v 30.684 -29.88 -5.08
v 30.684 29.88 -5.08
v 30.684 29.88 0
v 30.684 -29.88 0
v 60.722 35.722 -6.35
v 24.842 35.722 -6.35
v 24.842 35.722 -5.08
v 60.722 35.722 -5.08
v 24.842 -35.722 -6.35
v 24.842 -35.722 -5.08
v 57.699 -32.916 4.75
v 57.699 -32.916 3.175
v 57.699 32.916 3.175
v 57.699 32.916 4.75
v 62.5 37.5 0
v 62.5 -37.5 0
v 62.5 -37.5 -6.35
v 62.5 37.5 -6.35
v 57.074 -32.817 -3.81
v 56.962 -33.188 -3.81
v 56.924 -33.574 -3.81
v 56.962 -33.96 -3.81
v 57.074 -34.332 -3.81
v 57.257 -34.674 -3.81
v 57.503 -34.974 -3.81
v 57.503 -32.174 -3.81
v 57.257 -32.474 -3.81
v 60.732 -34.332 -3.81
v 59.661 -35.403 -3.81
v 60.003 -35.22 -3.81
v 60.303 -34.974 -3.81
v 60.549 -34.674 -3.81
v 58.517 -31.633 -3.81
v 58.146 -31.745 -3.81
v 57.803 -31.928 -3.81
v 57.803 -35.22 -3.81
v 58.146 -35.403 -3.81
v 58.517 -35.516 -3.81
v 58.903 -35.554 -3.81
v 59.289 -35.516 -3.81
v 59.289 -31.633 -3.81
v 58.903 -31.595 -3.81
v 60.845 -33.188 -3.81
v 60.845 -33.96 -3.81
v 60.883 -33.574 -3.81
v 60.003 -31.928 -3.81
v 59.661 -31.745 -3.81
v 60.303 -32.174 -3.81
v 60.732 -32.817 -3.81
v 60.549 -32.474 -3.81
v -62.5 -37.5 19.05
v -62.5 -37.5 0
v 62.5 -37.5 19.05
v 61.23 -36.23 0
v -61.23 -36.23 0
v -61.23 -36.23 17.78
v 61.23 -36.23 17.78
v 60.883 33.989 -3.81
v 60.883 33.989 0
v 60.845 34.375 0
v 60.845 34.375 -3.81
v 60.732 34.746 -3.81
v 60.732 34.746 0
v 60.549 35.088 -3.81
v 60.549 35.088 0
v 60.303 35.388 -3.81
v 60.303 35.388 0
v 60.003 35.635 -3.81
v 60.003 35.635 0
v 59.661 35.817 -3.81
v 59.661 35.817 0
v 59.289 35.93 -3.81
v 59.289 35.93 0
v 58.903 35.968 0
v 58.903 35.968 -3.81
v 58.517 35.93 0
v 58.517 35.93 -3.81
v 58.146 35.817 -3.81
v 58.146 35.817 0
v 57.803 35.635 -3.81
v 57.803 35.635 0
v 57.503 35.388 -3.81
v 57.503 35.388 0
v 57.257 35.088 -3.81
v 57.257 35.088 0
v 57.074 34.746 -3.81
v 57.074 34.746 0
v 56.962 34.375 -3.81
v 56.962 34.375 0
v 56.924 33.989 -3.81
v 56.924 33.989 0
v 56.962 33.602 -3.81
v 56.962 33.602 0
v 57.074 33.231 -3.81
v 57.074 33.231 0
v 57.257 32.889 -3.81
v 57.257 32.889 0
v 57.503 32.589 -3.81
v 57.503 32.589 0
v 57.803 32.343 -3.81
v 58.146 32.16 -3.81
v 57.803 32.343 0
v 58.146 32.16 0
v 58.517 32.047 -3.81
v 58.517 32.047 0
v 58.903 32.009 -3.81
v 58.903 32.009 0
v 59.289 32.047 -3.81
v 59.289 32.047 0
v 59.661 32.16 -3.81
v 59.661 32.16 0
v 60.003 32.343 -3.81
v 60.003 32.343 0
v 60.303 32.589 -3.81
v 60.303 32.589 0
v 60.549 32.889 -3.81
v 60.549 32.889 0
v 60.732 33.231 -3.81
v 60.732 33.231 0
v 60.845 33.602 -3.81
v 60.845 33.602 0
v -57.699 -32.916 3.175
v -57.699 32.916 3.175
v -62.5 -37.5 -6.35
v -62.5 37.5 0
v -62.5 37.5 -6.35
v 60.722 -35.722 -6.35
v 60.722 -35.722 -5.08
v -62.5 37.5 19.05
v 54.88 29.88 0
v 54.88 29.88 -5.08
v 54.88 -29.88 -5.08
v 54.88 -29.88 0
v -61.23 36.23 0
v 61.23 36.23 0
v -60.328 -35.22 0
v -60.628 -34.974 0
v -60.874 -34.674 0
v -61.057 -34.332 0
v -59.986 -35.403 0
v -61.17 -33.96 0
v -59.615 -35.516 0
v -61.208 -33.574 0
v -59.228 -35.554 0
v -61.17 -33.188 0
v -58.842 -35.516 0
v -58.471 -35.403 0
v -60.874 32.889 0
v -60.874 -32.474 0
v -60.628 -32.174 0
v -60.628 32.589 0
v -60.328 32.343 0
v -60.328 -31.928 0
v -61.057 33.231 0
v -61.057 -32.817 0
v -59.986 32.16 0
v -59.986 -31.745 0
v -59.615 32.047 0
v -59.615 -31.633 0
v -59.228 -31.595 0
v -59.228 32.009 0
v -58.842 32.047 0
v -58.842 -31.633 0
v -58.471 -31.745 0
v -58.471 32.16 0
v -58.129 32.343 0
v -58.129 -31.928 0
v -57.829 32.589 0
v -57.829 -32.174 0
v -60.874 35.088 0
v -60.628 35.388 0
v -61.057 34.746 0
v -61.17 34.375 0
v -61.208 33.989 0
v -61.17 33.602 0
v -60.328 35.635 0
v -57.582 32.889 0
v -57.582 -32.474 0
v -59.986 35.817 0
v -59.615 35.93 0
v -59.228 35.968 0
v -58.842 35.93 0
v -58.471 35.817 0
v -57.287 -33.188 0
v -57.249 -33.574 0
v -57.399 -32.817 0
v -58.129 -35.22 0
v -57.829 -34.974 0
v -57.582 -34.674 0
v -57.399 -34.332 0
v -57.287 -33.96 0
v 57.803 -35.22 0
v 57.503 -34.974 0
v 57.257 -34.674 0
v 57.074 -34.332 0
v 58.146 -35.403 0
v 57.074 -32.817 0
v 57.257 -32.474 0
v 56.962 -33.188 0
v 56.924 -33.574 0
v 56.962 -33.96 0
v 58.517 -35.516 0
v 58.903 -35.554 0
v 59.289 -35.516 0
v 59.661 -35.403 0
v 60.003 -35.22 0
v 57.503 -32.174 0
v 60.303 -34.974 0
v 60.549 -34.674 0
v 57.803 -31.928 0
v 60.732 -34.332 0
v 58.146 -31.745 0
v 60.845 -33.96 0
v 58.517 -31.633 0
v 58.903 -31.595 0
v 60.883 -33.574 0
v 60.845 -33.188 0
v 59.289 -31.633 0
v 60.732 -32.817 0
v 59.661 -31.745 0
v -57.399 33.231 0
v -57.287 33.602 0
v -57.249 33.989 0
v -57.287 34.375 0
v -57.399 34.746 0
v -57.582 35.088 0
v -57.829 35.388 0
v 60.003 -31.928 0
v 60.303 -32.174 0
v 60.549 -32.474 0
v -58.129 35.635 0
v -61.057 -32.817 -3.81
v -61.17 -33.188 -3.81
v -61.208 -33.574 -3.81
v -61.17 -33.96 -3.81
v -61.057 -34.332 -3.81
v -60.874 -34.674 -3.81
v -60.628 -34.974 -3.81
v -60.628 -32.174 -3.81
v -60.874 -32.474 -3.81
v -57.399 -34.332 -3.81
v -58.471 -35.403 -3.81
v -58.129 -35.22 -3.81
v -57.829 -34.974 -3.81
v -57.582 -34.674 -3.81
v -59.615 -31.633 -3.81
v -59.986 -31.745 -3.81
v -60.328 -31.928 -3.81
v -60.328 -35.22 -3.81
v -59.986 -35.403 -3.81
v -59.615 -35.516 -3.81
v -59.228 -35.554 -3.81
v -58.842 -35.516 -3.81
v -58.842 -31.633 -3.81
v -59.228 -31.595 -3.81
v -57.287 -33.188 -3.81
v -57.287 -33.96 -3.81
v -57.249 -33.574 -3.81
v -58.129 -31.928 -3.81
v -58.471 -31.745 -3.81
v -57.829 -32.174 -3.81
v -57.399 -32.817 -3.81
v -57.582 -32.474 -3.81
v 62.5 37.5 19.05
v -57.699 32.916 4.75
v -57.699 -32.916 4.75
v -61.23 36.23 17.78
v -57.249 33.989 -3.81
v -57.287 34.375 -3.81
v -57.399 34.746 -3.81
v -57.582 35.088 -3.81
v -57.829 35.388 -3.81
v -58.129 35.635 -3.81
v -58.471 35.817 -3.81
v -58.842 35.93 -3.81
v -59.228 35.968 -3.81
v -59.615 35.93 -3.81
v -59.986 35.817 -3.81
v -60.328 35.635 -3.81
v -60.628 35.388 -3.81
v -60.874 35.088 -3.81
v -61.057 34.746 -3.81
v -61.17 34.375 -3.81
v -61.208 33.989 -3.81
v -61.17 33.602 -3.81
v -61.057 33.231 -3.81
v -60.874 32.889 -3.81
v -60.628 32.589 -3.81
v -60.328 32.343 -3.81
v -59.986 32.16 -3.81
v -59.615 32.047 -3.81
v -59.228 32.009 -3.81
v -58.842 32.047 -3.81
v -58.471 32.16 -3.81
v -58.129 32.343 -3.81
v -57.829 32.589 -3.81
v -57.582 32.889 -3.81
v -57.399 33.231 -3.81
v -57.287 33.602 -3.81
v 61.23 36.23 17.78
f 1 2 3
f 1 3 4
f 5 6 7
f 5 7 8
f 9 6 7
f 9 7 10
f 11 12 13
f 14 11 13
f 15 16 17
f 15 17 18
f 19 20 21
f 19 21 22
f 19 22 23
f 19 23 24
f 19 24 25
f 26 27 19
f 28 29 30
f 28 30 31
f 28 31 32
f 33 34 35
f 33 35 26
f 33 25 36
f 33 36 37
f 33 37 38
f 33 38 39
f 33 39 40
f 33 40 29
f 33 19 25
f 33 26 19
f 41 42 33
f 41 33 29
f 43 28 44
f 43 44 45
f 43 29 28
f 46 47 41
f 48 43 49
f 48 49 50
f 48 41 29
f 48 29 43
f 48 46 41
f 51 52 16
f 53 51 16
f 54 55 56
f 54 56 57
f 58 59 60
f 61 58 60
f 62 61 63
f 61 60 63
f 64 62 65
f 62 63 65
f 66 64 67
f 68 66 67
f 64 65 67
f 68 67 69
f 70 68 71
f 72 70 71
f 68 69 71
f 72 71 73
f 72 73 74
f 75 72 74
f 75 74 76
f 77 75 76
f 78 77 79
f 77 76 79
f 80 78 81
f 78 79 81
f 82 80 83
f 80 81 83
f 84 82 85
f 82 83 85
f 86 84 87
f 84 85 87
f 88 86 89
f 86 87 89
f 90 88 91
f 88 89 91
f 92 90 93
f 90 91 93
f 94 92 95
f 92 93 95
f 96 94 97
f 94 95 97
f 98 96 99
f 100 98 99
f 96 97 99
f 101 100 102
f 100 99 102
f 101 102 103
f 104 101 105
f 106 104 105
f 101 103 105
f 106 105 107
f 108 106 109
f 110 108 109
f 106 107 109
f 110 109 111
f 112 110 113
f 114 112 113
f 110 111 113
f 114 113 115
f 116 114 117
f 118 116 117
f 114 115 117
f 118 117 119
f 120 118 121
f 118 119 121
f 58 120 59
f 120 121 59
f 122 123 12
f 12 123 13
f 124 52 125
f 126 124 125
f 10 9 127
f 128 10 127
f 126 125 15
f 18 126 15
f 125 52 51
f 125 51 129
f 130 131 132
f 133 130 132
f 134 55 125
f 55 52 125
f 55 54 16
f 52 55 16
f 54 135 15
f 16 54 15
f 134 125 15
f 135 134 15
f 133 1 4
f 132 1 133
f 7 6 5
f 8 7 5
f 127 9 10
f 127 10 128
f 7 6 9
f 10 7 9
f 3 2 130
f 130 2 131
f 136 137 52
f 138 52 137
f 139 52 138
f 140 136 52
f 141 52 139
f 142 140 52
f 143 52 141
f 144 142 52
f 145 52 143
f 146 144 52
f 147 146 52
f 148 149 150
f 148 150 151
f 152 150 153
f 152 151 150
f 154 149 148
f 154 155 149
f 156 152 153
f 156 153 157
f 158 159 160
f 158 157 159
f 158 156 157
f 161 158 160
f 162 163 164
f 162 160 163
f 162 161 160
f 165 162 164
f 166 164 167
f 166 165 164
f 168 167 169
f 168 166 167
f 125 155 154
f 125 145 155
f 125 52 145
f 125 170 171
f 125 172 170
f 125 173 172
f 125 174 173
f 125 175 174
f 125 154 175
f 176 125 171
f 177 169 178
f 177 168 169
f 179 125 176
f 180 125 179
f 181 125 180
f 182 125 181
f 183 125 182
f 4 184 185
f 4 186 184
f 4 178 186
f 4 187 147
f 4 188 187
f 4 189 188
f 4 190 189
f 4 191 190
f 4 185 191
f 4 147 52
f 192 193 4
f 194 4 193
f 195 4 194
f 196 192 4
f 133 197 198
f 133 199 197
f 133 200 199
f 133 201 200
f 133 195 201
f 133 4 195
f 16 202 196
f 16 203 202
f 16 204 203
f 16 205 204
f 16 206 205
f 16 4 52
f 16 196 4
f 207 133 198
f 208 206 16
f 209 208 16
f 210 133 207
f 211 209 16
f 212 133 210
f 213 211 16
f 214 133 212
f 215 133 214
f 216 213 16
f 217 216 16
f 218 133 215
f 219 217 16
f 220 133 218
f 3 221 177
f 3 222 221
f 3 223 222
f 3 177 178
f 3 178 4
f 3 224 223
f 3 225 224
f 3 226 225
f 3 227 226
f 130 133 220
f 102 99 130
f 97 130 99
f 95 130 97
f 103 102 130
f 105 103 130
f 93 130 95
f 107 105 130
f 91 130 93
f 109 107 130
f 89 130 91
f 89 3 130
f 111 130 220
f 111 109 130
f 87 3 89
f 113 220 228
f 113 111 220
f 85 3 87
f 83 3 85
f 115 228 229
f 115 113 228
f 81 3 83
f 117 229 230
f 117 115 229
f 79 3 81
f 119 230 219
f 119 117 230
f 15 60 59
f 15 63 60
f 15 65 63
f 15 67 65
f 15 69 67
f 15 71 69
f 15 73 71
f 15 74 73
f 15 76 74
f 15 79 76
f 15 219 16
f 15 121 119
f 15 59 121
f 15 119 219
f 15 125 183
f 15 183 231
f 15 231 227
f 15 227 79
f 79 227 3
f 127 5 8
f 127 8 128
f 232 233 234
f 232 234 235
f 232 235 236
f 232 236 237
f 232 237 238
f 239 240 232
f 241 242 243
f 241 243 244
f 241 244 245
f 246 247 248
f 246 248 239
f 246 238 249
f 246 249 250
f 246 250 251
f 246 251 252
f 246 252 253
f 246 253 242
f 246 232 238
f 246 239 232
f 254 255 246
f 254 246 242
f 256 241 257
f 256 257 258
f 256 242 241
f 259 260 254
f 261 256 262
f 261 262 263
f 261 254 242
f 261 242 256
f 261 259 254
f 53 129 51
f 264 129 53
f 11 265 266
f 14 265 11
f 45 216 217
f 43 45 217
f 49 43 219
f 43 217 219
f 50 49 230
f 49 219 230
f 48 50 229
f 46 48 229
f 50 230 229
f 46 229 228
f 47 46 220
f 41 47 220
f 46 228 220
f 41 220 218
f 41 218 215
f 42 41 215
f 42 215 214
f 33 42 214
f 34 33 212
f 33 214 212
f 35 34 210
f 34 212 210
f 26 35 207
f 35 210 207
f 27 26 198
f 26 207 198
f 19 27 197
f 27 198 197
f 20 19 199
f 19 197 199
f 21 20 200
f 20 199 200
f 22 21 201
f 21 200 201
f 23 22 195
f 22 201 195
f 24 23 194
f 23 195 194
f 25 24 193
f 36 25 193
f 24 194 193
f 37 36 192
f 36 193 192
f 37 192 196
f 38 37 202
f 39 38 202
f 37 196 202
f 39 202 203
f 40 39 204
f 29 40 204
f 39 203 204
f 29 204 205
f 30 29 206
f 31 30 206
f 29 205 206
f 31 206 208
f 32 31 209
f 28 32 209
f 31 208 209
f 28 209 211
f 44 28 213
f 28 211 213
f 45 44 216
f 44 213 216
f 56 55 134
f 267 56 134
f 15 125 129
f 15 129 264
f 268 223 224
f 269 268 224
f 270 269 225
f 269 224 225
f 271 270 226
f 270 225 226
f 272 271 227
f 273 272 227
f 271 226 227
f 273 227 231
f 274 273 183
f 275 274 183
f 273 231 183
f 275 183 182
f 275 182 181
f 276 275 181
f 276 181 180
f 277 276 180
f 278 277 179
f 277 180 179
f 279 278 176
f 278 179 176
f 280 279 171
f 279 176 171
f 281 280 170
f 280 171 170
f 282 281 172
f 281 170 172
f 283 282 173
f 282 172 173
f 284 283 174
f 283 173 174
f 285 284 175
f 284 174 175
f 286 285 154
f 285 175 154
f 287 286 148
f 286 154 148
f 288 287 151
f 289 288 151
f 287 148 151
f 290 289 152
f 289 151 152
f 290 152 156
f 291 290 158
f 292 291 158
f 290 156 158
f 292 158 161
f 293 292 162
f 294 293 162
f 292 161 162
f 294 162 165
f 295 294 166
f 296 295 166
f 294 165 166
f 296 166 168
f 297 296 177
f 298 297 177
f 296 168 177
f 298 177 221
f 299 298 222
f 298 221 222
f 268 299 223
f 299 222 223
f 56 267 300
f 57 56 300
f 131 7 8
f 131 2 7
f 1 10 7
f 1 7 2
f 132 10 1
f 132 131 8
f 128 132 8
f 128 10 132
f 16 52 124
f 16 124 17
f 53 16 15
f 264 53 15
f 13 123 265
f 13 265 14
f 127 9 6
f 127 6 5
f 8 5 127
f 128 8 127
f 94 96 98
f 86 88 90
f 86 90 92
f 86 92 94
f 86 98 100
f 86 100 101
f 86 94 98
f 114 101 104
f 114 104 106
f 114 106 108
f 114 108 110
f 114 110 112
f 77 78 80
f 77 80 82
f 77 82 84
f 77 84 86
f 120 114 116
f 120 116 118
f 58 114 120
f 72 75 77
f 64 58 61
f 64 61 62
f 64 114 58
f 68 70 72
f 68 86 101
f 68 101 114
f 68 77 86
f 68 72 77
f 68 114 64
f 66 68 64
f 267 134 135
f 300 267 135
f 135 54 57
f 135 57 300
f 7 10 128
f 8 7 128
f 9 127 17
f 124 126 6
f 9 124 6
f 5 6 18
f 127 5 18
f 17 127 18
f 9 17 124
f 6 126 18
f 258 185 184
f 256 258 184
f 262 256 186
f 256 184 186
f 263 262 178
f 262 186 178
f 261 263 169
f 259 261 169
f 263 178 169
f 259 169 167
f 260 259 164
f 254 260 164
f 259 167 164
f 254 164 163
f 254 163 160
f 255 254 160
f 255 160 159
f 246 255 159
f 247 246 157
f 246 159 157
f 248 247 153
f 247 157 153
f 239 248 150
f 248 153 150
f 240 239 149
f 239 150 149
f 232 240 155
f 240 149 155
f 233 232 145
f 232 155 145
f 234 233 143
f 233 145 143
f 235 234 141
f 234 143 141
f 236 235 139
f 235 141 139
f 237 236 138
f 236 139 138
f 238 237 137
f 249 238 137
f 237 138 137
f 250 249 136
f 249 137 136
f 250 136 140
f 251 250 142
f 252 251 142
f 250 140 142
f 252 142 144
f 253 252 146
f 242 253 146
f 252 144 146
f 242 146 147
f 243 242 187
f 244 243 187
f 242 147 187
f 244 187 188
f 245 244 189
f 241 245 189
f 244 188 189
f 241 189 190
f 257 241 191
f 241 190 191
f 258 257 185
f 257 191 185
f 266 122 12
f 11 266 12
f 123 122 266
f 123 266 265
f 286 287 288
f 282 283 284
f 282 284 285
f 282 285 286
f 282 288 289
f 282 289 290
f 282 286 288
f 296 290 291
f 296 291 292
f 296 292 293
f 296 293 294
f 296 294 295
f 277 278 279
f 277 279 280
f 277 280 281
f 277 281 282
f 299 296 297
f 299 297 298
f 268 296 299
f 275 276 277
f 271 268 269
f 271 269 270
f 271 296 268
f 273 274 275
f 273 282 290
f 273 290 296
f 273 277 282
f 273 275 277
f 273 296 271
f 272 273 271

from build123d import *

# Parameters (mm, degrees)
F0_W      = 125
F0_H      = 75
F1_DEPTH  = 6.35
F3_W      = 115.3970956802
F3_H      = 65.8323019743
F4_DEPTH  = 1.5748
F5_W      = 125
F5_H      = 75
F6_DEPTH  = 19.05
F7_W      = 24.196354863
F7_H      = 59.76
F8_DEPTH  = 6.35
F9_W      = 35.880353672
F9_H      = 71.443998809
F10_DEPTH = 1.27
F11_DEPTH = 1.27
F12_T     = -1.27
F13_R     = 1.9796250157
F14_DEPTH = 3.81


with BuildPart() as f1:
    # F0 (on Top) → F1 (new body)
    with BuildSketch(Plane.XY):
        Rectangle(F0_W, F0_H)
    extrude(amount=-F1_DEPTH)

    # F7 (on face) → F8 (cut, through all)
    with BuildSketch(Plane(origin=(0, 0, -6.35), x_dir=(1, 0, 0), z_dir=(0, 0, -1))):
        with Locations((42.7818225685, 0)):
            Rectangle(F7_W, F7_H)
    extrude(amount=-F8_DEPTH, mode=Mode.SUBTRACT)

    # F9 (on face) → F10 (cut)
    with BuildSketch(Plane(origin=(0, 0, -6.35), x_dir=(1, 0, 0), z_dir=(0, 0, -1))):
        with Locations((42.7818225685, 0)):
            Rectangle(F9_W, F9_H)
    extrude(amount=-F10_DEPTH, mode=Mode.SUBTRACT)

    # F13 (on face) → F14 (cut)
    with BuildSketch(Plane.XY):
        with Locations((58.9032660389, 33.9885211441)):
            Circle(F13_R)
        with Locations((58.9032660389, -33.5741745865)):
            Circle(F13_R)
        with Locations((-59.2283262906, -33.5741745865)):
            Circle(F13_R)
        with Locations((-59.2283262906, 33.9885211441)):
            Circle(F13_R)
    extrude(amount=-F14_DEPTH, mode=Mode.SUBTRACT)


with BuildPart() as f4:
    # F3 (on offset) → F4 (new body)
    with BuildSketch(Plane.XY.offset(3.175)):
        Rectangle(F3_W, F3_H)
    extrude(amount=F4_DEPTH)


with BuildPart() as f6:
    # F5 (on Top) → F6 (new body)
    with BuildSketch(Plane.XY):
        Rectangle(F5_W, F5_H)
    extrude(amount=F6_DEPTH)

    # F12
    f12_openings = [f6.faces().sort_by_distance(p)[0] for p in [
        (0, 0, 0),
    ]]
    offset(amount=F12_T, openings=f12_openings)


with BuildPart() as f11:
    # F9 (on face) → F11 (new body)
    with BuildSketch(Plane(origin=(0, 0, -6.35), x_dir=(1, 0, 0), z_dir=(0, 0, -1))):
        with Locations((42.7818225685, 0)):
            Rectangle(F9_W, F9_H)
    extrude(amount=-F11_DEPTH)


solid = Compound([f1.part, f4.part, f6.part, f11.part])
